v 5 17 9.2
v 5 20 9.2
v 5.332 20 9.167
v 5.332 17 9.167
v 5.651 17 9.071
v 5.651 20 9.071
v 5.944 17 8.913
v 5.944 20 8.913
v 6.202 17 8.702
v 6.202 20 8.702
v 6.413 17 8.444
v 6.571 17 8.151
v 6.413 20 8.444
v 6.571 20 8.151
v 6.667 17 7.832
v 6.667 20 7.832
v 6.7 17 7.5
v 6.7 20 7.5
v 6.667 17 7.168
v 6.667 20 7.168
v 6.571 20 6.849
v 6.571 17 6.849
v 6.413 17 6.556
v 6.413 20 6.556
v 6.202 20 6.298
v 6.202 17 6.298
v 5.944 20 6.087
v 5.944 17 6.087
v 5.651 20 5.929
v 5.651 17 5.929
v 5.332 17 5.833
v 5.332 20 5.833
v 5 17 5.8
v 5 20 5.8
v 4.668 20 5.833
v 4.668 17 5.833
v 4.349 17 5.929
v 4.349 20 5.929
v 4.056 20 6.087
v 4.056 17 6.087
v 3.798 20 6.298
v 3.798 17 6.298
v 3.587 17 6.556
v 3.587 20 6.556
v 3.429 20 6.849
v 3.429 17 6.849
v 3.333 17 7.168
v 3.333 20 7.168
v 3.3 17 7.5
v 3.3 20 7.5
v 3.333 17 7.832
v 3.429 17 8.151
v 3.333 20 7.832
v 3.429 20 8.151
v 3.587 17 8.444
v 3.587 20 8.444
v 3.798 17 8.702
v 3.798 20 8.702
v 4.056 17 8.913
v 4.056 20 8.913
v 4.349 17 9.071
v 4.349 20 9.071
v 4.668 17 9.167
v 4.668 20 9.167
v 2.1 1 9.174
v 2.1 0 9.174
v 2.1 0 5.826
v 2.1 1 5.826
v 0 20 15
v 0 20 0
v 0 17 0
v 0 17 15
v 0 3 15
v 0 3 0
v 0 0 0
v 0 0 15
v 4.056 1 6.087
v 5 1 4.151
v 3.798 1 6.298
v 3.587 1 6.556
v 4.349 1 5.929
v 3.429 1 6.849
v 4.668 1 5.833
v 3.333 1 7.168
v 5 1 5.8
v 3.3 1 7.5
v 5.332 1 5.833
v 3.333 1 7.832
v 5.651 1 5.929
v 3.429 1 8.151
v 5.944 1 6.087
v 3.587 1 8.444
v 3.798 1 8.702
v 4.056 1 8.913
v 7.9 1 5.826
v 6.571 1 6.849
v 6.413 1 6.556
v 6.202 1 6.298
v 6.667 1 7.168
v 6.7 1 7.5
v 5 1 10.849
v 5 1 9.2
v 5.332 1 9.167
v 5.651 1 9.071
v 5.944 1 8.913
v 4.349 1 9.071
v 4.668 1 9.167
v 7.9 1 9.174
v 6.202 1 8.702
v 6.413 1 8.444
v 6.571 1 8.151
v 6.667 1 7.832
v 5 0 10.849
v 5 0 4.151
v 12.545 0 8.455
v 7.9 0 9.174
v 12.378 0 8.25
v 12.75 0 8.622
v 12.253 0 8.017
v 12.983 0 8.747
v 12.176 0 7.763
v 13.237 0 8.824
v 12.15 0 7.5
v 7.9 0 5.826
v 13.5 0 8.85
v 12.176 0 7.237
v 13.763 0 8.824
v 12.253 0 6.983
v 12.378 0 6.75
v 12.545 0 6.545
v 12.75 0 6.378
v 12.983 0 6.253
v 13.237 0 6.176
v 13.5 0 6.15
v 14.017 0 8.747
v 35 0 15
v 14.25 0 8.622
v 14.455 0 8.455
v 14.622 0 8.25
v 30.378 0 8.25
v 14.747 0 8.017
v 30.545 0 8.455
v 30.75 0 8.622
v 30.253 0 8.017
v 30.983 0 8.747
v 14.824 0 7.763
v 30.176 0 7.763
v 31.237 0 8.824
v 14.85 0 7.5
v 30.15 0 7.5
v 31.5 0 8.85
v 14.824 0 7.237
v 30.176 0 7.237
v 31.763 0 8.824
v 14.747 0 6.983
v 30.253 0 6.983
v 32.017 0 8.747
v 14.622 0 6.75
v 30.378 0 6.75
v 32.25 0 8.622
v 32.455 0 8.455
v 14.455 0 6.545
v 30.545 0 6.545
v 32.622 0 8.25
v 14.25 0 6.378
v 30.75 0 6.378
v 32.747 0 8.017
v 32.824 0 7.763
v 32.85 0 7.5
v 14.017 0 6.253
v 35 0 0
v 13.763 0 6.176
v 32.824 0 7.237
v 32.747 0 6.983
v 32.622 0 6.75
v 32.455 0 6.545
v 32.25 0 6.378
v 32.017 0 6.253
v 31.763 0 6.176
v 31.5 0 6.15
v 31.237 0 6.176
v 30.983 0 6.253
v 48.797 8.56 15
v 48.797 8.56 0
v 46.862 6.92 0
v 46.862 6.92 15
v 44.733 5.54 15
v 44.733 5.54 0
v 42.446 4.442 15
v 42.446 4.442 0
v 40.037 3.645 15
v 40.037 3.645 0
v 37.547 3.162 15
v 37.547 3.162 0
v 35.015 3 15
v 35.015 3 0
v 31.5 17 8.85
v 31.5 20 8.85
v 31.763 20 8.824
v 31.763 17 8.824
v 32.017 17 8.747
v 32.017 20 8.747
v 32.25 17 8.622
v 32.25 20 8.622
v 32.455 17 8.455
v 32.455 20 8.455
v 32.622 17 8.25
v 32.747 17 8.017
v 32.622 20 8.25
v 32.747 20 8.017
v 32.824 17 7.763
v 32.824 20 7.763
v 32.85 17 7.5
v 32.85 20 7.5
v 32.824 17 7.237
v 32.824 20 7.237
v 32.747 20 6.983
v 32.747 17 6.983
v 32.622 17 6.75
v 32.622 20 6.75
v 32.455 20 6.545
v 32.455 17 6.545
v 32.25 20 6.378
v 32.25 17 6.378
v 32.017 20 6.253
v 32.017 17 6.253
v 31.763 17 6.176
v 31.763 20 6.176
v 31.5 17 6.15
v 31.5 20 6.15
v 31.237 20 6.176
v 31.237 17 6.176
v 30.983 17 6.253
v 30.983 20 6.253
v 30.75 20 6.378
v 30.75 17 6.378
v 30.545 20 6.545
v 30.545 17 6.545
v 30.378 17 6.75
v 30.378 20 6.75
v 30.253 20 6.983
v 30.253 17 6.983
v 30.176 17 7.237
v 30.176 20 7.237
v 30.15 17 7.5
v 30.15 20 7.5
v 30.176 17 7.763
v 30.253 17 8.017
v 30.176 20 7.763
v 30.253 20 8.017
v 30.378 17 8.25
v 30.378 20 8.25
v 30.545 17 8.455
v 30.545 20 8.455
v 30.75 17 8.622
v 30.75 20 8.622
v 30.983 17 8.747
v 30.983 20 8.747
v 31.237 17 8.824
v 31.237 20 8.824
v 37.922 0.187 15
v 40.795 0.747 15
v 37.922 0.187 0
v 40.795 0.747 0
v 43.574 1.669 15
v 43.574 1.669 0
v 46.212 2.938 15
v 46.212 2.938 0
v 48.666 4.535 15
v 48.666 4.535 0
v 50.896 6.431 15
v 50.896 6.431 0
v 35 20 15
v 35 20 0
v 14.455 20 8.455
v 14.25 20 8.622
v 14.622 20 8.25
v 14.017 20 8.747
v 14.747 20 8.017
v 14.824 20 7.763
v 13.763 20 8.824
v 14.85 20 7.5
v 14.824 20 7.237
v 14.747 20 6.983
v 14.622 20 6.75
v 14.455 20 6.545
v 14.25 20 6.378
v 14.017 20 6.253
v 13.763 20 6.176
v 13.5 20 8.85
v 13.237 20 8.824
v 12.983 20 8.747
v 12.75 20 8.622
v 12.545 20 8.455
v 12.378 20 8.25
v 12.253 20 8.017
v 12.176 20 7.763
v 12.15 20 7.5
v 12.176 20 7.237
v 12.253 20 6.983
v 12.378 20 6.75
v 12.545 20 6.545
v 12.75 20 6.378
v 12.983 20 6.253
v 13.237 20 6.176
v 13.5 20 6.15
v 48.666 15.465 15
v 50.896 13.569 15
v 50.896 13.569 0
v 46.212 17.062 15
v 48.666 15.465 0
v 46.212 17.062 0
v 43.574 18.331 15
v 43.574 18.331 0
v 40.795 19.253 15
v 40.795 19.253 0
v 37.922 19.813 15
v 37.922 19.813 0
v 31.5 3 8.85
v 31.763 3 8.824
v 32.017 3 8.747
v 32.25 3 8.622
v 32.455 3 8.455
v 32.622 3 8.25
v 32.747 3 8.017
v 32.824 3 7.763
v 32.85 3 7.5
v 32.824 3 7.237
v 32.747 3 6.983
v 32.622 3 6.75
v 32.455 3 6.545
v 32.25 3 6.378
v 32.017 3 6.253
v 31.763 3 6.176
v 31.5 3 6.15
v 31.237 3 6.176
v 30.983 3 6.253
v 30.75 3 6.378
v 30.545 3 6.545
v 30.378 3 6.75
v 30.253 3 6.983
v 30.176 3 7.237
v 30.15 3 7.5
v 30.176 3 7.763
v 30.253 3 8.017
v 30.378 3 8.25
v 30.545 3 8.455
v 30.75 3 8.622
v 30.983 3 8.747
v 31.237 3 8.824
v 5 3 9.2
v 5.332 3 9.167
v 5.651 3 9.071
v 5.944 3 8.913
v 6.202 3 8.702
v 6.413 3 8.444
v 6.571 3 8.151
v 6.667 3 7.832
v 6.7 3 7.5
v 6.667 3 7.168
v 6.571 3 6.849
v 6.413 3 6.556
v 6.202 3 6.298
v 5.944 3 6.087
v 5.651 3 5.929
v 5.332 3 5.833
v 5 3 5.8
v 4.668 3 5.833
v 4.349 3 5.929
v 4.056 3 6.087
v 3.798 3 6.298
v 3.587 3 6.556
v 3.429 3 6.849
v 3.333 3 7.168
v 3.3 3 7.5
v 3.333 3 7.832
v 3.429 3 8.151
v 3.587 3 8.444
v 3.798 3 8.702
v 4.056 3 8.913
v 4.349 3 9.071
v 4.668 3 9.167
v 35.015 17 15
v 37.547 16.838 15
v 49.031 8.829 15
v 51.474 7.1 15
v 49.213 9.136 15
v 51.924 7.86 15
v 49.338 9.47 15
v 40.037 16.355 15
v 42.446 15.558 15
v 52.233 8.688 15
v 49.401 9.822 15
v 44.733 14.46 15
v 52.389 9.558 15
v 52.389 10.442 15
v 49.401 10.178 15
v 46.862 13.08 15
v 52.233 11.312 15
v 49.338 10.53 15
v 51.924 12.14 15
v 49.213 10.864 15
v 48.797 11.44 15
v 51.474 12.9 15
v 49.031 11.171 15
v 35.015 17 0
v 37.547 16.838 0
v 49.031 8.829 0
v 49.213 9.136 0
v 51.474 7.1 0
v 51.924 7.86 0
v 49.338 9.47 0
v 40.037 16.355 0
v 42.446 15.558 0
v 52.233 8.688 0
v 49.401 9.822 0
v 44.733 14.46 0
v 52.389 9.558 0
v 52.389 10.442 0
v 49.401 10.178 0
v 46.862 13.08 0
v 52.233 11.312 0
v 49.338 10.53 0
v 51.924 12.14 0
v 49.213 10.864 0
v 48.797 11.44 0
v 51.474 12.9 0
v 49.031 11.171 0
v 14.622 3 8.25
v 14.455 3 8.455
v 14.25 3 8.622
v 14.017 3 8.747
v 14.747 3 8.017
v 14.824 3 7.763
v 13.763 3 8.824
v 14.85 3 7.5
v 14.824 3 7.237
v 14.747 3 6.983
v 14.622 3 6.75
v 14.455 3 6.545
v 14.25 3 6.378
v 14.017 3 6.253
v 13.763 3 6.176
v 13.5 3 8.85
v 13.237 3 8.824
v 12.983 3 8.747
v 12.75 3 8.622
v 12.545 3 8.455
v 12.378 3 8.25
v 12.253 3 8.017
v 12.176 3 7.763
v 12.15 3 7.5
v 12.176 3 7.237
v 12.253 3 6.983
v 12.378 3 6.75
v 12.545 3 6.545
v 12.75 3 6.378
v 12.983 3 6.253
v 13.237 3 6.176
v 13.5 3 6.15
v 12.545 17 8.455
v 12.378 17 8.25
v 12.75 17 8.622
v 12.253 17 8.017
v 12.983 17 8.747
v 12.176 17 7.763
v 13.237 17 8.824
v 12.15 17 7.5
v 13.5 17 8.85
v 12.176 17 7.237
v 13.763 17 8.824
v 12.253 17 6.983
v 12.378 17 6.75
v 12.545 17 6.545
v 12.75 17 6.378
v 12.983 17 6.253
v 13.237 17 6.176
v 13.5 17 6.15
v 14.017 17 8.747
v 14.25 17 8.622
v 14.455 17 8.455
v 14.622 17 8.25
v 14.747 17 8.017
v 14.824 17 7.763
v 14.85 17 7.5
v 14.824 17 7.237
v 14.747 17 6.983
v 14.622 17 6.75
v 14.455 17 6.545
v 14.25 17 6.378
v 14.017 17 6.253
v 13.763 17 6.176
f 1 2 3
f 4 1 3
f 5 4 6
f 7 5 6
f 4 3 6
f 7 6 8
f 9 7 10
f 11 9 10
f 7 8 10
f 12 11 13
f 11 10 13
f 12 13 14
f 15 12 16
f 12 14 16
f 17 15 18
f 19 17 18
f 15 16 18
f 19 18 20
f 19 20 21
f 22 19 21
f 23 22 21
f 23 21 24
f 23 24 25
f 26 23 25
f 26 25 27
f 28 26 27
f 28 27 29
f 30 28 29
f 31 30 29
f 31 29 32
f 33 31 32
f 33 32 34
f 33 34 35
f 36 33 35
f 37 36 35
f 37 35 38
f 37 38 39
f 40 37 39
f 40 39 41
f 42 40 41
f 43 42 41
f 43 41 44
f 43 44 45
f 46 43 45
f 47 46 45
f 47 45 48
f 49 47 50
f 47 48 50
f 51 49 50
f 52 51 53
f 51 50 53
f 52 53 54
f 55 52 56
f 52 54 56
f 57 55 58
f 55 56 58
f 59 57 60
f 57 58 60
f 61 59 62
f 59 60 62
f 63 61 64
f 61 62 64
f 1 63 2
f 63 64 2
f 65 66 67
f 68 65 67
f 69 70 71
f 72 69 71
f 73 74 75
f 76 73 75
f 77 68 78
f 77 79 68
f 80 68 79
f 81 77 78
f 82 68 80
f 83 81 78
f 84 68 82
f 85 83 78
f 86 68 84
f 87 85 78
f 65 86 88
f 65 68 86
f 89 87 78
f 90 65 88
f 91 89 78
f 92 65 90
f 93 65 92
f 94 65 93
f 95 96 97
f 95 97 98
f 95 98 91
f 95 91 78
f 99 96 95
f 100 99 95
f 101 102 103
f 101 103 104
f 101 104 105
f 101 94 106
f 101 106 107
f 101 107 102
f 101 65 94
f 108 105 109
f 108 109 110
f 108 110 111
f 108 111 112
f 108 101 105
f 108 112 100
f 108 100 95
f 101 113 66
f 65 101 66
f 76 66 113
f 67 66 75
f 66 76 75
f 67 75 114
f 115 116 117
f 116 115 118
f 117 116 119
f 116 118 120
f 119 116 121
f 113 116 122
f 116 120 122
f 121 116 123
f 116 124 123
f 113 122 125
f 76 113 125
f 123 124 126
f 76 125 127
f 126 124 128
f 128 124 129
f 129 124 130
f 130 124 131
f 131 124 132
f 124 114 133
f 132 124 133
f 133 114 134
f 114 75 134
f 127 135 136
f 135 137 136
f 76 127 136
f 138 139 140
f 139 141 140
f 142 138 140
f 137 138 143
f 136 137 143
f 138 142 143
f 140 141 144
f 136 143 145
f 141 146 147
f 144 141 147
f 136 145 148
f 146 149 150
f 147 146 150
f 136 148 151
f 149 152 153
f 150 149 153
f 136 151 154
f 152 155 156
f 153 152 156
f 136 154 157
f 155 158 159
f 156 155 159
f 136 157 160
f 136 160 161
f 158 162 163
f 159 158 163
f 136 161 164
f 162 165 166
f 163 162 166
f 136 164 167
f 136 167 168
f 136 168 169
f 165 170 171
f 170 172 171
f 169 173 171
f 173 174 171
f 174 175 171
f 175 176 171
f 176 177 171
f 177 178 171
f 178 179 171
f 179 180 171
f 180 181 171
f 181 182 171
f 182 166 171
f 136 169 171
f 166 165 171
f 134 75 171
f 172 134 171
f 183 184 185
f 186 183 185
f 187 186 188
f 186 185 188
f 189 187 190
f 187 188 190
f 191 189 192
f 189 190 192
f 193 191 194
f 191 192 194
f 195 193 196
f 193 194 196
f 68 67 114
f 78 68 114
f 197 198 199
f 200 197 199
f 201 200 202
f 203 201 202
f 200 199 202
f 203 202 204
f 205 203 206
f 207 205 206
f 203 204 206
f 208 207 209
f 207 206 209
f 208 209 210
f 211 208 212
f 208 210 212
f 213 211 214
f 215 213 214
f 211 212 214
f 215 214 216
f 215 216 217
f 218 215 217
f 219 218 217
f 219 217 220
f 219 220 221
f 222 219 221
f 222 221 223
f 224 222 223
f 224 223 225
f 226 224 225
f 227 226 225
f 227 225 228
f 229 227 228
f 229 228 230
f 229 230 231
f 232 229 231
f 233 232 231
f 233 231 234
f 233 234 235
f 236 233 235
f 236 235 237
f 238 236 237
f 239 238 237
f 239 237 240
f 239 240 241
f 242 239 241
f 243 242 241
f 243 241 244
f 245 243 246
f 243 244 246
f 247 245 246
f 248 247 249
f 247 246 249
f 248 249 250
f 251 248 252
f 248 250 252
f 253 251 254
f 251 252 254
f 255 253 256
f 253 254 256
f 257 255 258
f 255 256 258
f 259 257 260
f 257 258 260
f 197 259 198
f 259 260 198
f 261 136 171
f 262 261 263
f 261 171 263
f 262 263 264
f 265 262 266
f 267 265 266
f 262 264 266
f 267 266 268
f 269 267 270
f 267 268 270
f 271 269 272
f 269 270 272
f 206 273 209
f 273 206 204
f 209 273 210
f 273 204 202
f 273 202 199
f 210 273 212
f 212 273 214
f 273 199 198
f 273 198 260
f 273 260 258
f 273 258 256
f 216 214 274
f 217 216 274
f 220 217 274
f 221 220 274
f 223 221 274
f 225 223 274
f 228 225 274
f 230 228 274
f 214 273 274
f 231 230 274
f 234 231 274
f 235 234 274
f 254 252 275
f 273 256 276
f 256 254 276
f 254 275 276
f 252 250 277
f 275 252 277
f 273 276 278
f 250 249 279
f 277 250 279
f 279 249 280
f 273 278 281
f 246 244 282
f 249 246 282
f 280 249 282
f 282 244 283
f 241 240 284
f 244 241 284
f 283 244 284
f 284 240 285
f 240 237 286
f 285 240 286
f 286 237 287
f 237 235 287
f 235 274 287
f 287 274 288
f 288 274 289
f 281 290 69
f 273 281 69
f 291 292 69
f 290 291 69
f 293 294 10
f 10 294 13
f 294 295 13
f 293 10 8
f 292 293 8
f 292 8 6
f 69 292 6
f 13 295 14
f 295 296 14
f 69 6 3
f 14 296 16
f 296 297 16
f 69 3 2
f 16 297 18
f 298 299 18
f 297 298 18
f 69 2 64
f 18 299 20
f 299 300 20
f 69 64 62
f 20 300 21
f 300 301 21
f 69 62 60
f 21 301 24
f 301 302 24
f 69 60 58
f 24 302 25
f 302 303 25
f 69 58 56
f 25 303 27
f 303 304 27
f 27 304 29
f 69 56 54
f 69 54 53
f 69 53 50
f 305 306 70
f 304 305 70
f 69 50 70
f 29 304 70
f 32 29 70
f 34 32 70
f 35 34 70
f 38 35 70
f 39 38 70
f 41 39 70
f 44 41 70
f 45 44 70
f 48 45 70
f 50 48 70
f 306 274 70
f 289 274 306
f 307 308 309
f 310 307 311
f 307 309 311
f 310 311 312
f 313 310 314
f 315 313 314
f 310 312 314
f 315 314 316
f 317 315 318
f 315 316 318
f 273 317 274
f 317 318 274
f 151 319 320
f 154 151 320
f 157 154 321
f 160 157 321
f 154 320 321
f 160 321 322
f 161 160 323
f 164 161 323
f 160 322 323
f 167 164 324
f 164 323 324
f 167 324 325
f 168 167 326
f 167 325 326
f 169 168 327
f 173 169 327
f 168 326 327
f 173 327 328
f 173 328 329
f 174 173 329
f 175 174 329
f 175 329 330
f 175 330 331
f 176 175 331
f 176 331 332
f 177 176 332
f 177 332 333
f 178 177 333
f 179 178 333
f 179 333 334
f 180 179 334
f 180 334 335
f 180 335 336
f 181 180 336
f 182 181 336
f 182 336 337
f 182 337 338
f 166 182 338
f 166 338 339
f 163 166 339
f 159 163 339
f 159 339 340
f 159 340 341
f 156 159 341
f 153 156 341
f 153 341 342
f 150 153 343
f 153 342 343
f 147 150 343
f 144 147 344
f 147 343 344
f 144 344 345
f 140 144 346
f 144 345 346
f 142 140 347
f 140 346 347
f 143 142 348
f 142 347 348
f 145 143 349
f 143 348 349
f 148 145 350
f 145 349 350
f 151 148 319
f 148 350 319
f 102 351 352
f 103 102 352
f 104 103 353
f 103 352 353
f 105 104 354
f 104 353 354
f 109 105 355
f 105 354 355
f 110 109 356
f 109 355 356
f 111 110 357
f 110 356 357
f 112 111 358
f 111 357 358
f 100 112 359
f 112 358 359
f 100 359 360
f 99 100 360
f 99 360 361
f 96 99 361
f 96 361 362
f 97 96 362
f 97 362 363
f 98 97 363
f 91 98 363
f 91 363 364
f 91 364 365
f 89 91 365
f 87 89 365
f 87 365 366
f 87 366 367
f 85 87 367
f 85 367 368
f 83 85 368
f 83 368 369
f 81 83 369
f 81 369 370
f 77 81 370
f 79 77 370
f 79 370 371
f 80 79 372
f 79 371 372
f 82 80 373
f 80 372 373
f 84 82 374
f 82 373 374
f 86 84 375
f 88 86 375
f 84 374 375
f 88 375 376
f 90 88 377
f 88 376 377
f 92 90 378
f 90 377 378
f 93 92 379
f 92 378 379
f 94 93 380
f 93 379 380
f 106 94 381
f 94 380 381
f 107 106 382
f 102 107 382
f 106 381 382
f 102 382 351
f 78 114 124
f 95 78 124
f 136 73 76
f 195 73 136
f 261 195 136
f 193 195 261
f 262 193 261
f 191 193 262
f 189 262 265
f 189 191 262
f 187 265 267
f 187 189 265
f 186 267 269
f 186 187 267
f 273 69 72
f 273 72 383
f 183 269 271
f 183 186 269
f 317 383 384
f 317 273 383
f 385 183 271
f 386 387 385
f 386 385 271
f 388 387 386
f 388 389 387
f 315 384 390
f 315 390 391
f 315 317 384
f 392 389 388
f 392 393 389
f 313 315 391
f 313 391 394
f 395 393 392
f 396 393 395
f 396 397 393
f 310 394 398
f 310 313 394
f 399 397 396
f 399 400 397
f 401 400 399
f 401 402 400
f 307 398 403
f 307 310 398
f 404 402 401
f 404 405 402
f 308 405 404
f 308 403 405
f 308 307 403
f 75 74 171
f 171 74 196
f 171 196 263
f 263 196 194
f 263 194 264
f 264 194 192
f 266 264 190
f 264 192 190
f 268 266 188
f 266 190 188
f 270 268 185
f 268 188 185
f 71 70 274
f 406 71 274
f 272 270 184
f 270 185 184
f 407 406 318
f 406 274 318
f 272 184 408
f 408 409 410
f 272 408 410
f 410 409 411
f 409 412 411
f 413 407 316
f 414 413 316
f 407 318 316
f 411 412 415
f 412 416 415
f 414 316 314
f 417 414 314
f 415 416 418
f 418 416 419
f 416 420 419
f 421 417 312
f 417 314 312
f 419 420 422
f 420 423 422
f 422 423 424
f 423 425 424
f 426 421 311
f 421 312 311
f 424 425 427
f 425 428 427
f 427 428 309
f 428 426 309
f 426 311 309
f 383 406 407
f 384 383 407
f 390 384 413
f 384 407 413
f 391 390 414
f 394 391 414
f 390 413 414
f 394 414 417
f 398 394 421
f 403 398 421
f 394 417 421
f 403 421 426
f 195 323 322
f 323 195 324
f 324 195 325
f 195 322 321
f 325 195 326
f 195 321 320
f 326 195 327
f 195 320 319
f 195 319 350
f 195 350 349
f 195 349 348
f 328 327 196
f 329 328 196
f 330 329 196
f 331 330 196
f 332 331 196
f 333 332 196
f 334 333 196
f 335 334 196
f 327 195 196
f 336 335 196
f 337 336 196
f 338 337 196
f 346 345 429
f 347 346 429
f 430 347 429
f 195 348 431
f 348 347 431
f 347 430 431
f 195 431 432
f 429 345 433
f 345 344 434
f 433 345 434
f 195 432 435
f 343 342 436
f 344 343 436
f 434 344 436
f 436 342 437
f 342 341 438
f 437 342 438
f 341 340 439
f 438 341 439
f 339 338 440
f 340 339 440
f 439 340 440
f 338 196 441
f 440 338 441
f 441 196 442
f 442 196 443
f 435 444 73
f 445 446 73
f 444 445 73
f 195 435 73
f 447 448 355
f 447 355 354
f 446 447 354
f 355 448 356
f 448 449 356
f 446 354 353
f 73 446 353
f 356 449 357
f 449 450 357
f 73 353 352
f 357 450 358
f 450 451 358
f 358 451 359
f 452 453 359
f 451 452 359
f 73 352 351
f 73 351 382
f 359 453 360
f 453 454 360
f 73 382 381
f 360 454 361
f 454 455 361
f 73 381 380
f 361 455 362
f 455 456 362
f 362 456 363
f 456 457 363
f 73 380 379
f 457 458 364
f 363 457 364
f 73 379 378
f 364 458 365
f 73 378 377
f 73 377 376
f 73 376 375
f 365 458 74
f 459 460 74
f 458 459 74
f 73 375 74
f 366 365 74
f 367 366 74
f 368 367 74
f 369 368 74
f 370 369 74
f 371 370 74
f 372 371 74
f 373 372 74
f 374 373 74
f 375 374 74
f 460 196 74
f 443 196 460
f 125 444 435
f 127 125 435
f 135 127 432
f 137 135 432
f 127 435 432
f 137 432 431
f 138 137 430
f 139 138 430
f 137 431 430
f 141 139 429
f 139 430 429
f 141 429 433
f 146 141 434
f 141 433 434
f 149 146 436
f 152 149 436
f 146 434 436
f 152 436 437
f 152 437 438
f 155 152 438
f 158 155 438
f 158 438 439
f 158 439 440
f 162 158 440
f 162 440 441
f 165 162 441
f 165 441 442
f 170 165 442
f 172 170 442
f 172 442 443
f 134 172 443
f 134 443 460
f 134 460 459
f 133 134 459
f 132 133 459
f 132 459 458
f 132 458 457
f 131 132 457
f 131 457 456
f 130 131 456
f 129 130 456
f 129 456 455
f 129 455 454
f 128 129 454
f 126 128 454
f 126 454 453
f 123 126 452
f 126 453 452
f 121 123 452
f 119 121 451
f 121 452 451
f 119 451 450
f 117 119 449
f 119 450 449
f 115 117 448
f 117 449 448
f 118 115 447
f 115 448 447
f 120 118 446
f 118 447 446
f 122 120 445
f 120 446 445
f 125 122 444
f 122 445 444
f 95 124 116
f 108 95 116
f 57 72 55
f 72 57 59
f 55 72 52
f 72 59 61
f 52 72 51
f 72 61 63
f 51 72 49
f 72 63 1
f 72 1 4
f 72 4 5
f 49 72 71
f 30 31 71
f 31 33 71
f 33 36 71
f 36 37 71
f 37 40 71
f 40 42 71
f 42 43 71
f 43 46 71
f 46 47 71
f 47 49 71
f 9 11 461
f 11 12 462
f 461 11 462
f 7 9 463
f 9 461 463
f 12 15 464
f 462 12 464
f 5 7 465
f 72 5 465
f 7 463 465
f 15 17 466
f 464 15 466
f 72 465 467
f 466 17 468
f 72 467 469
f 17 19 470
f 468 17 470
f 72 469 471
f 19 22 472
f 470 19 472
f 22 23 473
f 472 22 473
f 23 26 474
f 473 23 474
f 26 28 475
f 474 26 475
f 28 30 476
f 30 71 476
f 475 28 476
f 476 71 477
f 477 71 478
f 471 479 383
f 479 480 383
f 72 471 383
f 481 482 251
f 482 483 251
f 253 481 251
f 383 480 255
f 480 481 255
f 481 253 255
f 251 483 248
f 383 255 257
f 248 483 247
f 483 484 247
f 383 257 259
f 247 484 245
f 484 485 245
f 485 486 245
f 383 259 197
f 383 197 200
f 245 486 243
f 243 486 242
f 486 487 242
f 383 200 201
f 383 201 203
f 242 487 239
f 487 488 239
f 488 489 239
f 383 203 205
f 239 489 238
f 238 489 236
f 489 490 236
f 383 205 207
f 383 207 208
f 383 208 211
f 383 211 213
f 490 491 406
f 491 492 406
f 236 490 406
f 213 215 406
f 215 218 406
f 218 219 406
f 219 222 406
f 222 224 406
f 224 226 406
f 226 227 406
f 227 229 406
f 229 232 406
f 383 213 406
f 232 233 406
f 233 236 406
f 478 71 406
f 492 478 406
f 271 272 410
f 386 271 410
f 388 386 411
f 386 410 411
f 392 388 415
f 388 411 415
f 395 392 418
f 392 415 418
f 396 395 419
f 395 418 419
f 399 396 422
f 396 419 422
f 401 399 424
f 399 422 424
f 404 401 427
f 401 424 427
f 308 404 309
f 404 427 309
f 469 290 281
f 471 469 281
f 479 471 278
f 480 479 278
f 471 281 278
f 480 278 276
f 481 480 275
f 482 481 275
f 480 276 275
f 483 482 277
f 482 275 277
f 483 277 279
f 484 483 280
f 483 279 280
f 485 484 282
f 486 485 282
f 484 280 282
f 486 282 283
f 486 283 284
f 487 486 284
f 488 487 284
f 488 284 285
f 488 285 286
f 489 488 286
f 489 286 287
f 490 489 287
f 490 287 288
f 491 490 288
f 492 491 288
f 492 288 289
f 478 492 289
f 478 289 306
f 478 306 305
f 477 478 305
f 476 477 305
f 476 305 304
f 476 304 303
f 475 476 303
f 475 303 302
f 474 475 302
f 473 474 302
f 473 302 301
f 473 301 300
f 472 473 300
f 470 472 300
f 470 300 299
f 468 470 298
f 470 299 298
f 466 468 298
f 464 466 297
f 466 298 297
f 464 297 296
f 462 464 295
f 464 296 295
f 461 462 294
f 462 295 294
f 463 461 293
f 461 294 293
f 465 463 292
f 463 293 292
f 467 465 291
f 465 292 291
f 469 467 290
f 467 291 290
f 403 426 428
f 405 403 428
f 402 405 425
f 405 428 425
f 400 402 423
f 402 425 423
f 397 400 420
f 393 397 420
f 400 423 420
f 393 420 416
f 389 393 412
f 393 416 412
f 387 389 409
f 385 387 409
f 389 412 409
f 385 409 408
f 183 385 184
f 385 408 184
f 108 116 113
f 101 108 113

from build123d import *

# Parameters (mm, degrees)
BOSS_EXTRUDE1_DEPTH = 15
SKETCH2_R           = 1.7
SKETCH2_R_2         = 1.35
CUT_EXTRUDE1_DEPTH  = 59.066473529
CUT_EXTRUDE2_DEPTH  = 1


with BuildPart() as part:
    # Sketch1 → Boss-Extrude1 (new body)
    with BuildSketch(Plane.XY):
        with BuildLine():
            Line((0, 0), (35, 0))
            ThreePointArc((35, 0), (43.574008742, 1.66873563), (50.896306384, 6.431325448))
            ThreePointArc((50.896306384, 6.431325448), (52.409115124, 10), (50.896306384, 13.568674552))
            ThreePointArc((50.896306384, 13.568674552), (43.574008742, 18.33126437), (35, 20))
            Line((35, 20), (0, 20))
            Line((0, 20), (0, 17))
            Line((0, 17), (35.015119776, 17))
            ThreePointArc((35.015119776, 17), (42.445641677, 15.557658707), (48.796934125, 11.440124447))
            ThreePointArc((48.796934125, 11.440124447), (49.409115124, 10), (48.796934125, 8.559875553))
            ThreePointArc((48.796934125, 8.559875553), (42.445641677, 4.442341293), (35.015119776, 3))
            Line((35.015119776, 3), (0, 3))
            Line((0, 3), (0, 0))
        make_face()
    extrude(amount=BOSS_EXTRUDE1_DEPTH)

    # Sketch2 → Cut-Extrude1 (cut, through all)
    with BuildSketch(Plane(origin=(0, 20, 0), x_dir=(1, 0, 0), z_dir=(0, 1, 0))):
        with Locations(Location((5, -7.5, 0), (0, 0, 270))):
            Circle(SKETCH2_R)
        with Locations(Location((13.5, -7.5, 0), (0, 0, 270))):
            Circle(SKETCH2_R_2)
        with Locations(Location((31.5, -7.5, 0), (0, 0, 270))):
            Circle(SKETCH2_R_2)
    extrude(amount=-CUT_EXTRUDE1_DEPTH, mode=Mode.SUBTRACT)

    # Sketch3 → Cut-Extrude2 (cut)
    with BuildSketch(Plane.XZ):
        Polygon((5, 10.848631561), (2.1, 9.174315781), (2.1, 5.825684219), (5, 4.151368439), (7.9, 5.825684219), (7.9, 9.174315781), align=None)
    extrude(amount=-CUT_EXTRUDE2_DEPTH, mode=Mode.SUBTRACT)


solid = part.part
